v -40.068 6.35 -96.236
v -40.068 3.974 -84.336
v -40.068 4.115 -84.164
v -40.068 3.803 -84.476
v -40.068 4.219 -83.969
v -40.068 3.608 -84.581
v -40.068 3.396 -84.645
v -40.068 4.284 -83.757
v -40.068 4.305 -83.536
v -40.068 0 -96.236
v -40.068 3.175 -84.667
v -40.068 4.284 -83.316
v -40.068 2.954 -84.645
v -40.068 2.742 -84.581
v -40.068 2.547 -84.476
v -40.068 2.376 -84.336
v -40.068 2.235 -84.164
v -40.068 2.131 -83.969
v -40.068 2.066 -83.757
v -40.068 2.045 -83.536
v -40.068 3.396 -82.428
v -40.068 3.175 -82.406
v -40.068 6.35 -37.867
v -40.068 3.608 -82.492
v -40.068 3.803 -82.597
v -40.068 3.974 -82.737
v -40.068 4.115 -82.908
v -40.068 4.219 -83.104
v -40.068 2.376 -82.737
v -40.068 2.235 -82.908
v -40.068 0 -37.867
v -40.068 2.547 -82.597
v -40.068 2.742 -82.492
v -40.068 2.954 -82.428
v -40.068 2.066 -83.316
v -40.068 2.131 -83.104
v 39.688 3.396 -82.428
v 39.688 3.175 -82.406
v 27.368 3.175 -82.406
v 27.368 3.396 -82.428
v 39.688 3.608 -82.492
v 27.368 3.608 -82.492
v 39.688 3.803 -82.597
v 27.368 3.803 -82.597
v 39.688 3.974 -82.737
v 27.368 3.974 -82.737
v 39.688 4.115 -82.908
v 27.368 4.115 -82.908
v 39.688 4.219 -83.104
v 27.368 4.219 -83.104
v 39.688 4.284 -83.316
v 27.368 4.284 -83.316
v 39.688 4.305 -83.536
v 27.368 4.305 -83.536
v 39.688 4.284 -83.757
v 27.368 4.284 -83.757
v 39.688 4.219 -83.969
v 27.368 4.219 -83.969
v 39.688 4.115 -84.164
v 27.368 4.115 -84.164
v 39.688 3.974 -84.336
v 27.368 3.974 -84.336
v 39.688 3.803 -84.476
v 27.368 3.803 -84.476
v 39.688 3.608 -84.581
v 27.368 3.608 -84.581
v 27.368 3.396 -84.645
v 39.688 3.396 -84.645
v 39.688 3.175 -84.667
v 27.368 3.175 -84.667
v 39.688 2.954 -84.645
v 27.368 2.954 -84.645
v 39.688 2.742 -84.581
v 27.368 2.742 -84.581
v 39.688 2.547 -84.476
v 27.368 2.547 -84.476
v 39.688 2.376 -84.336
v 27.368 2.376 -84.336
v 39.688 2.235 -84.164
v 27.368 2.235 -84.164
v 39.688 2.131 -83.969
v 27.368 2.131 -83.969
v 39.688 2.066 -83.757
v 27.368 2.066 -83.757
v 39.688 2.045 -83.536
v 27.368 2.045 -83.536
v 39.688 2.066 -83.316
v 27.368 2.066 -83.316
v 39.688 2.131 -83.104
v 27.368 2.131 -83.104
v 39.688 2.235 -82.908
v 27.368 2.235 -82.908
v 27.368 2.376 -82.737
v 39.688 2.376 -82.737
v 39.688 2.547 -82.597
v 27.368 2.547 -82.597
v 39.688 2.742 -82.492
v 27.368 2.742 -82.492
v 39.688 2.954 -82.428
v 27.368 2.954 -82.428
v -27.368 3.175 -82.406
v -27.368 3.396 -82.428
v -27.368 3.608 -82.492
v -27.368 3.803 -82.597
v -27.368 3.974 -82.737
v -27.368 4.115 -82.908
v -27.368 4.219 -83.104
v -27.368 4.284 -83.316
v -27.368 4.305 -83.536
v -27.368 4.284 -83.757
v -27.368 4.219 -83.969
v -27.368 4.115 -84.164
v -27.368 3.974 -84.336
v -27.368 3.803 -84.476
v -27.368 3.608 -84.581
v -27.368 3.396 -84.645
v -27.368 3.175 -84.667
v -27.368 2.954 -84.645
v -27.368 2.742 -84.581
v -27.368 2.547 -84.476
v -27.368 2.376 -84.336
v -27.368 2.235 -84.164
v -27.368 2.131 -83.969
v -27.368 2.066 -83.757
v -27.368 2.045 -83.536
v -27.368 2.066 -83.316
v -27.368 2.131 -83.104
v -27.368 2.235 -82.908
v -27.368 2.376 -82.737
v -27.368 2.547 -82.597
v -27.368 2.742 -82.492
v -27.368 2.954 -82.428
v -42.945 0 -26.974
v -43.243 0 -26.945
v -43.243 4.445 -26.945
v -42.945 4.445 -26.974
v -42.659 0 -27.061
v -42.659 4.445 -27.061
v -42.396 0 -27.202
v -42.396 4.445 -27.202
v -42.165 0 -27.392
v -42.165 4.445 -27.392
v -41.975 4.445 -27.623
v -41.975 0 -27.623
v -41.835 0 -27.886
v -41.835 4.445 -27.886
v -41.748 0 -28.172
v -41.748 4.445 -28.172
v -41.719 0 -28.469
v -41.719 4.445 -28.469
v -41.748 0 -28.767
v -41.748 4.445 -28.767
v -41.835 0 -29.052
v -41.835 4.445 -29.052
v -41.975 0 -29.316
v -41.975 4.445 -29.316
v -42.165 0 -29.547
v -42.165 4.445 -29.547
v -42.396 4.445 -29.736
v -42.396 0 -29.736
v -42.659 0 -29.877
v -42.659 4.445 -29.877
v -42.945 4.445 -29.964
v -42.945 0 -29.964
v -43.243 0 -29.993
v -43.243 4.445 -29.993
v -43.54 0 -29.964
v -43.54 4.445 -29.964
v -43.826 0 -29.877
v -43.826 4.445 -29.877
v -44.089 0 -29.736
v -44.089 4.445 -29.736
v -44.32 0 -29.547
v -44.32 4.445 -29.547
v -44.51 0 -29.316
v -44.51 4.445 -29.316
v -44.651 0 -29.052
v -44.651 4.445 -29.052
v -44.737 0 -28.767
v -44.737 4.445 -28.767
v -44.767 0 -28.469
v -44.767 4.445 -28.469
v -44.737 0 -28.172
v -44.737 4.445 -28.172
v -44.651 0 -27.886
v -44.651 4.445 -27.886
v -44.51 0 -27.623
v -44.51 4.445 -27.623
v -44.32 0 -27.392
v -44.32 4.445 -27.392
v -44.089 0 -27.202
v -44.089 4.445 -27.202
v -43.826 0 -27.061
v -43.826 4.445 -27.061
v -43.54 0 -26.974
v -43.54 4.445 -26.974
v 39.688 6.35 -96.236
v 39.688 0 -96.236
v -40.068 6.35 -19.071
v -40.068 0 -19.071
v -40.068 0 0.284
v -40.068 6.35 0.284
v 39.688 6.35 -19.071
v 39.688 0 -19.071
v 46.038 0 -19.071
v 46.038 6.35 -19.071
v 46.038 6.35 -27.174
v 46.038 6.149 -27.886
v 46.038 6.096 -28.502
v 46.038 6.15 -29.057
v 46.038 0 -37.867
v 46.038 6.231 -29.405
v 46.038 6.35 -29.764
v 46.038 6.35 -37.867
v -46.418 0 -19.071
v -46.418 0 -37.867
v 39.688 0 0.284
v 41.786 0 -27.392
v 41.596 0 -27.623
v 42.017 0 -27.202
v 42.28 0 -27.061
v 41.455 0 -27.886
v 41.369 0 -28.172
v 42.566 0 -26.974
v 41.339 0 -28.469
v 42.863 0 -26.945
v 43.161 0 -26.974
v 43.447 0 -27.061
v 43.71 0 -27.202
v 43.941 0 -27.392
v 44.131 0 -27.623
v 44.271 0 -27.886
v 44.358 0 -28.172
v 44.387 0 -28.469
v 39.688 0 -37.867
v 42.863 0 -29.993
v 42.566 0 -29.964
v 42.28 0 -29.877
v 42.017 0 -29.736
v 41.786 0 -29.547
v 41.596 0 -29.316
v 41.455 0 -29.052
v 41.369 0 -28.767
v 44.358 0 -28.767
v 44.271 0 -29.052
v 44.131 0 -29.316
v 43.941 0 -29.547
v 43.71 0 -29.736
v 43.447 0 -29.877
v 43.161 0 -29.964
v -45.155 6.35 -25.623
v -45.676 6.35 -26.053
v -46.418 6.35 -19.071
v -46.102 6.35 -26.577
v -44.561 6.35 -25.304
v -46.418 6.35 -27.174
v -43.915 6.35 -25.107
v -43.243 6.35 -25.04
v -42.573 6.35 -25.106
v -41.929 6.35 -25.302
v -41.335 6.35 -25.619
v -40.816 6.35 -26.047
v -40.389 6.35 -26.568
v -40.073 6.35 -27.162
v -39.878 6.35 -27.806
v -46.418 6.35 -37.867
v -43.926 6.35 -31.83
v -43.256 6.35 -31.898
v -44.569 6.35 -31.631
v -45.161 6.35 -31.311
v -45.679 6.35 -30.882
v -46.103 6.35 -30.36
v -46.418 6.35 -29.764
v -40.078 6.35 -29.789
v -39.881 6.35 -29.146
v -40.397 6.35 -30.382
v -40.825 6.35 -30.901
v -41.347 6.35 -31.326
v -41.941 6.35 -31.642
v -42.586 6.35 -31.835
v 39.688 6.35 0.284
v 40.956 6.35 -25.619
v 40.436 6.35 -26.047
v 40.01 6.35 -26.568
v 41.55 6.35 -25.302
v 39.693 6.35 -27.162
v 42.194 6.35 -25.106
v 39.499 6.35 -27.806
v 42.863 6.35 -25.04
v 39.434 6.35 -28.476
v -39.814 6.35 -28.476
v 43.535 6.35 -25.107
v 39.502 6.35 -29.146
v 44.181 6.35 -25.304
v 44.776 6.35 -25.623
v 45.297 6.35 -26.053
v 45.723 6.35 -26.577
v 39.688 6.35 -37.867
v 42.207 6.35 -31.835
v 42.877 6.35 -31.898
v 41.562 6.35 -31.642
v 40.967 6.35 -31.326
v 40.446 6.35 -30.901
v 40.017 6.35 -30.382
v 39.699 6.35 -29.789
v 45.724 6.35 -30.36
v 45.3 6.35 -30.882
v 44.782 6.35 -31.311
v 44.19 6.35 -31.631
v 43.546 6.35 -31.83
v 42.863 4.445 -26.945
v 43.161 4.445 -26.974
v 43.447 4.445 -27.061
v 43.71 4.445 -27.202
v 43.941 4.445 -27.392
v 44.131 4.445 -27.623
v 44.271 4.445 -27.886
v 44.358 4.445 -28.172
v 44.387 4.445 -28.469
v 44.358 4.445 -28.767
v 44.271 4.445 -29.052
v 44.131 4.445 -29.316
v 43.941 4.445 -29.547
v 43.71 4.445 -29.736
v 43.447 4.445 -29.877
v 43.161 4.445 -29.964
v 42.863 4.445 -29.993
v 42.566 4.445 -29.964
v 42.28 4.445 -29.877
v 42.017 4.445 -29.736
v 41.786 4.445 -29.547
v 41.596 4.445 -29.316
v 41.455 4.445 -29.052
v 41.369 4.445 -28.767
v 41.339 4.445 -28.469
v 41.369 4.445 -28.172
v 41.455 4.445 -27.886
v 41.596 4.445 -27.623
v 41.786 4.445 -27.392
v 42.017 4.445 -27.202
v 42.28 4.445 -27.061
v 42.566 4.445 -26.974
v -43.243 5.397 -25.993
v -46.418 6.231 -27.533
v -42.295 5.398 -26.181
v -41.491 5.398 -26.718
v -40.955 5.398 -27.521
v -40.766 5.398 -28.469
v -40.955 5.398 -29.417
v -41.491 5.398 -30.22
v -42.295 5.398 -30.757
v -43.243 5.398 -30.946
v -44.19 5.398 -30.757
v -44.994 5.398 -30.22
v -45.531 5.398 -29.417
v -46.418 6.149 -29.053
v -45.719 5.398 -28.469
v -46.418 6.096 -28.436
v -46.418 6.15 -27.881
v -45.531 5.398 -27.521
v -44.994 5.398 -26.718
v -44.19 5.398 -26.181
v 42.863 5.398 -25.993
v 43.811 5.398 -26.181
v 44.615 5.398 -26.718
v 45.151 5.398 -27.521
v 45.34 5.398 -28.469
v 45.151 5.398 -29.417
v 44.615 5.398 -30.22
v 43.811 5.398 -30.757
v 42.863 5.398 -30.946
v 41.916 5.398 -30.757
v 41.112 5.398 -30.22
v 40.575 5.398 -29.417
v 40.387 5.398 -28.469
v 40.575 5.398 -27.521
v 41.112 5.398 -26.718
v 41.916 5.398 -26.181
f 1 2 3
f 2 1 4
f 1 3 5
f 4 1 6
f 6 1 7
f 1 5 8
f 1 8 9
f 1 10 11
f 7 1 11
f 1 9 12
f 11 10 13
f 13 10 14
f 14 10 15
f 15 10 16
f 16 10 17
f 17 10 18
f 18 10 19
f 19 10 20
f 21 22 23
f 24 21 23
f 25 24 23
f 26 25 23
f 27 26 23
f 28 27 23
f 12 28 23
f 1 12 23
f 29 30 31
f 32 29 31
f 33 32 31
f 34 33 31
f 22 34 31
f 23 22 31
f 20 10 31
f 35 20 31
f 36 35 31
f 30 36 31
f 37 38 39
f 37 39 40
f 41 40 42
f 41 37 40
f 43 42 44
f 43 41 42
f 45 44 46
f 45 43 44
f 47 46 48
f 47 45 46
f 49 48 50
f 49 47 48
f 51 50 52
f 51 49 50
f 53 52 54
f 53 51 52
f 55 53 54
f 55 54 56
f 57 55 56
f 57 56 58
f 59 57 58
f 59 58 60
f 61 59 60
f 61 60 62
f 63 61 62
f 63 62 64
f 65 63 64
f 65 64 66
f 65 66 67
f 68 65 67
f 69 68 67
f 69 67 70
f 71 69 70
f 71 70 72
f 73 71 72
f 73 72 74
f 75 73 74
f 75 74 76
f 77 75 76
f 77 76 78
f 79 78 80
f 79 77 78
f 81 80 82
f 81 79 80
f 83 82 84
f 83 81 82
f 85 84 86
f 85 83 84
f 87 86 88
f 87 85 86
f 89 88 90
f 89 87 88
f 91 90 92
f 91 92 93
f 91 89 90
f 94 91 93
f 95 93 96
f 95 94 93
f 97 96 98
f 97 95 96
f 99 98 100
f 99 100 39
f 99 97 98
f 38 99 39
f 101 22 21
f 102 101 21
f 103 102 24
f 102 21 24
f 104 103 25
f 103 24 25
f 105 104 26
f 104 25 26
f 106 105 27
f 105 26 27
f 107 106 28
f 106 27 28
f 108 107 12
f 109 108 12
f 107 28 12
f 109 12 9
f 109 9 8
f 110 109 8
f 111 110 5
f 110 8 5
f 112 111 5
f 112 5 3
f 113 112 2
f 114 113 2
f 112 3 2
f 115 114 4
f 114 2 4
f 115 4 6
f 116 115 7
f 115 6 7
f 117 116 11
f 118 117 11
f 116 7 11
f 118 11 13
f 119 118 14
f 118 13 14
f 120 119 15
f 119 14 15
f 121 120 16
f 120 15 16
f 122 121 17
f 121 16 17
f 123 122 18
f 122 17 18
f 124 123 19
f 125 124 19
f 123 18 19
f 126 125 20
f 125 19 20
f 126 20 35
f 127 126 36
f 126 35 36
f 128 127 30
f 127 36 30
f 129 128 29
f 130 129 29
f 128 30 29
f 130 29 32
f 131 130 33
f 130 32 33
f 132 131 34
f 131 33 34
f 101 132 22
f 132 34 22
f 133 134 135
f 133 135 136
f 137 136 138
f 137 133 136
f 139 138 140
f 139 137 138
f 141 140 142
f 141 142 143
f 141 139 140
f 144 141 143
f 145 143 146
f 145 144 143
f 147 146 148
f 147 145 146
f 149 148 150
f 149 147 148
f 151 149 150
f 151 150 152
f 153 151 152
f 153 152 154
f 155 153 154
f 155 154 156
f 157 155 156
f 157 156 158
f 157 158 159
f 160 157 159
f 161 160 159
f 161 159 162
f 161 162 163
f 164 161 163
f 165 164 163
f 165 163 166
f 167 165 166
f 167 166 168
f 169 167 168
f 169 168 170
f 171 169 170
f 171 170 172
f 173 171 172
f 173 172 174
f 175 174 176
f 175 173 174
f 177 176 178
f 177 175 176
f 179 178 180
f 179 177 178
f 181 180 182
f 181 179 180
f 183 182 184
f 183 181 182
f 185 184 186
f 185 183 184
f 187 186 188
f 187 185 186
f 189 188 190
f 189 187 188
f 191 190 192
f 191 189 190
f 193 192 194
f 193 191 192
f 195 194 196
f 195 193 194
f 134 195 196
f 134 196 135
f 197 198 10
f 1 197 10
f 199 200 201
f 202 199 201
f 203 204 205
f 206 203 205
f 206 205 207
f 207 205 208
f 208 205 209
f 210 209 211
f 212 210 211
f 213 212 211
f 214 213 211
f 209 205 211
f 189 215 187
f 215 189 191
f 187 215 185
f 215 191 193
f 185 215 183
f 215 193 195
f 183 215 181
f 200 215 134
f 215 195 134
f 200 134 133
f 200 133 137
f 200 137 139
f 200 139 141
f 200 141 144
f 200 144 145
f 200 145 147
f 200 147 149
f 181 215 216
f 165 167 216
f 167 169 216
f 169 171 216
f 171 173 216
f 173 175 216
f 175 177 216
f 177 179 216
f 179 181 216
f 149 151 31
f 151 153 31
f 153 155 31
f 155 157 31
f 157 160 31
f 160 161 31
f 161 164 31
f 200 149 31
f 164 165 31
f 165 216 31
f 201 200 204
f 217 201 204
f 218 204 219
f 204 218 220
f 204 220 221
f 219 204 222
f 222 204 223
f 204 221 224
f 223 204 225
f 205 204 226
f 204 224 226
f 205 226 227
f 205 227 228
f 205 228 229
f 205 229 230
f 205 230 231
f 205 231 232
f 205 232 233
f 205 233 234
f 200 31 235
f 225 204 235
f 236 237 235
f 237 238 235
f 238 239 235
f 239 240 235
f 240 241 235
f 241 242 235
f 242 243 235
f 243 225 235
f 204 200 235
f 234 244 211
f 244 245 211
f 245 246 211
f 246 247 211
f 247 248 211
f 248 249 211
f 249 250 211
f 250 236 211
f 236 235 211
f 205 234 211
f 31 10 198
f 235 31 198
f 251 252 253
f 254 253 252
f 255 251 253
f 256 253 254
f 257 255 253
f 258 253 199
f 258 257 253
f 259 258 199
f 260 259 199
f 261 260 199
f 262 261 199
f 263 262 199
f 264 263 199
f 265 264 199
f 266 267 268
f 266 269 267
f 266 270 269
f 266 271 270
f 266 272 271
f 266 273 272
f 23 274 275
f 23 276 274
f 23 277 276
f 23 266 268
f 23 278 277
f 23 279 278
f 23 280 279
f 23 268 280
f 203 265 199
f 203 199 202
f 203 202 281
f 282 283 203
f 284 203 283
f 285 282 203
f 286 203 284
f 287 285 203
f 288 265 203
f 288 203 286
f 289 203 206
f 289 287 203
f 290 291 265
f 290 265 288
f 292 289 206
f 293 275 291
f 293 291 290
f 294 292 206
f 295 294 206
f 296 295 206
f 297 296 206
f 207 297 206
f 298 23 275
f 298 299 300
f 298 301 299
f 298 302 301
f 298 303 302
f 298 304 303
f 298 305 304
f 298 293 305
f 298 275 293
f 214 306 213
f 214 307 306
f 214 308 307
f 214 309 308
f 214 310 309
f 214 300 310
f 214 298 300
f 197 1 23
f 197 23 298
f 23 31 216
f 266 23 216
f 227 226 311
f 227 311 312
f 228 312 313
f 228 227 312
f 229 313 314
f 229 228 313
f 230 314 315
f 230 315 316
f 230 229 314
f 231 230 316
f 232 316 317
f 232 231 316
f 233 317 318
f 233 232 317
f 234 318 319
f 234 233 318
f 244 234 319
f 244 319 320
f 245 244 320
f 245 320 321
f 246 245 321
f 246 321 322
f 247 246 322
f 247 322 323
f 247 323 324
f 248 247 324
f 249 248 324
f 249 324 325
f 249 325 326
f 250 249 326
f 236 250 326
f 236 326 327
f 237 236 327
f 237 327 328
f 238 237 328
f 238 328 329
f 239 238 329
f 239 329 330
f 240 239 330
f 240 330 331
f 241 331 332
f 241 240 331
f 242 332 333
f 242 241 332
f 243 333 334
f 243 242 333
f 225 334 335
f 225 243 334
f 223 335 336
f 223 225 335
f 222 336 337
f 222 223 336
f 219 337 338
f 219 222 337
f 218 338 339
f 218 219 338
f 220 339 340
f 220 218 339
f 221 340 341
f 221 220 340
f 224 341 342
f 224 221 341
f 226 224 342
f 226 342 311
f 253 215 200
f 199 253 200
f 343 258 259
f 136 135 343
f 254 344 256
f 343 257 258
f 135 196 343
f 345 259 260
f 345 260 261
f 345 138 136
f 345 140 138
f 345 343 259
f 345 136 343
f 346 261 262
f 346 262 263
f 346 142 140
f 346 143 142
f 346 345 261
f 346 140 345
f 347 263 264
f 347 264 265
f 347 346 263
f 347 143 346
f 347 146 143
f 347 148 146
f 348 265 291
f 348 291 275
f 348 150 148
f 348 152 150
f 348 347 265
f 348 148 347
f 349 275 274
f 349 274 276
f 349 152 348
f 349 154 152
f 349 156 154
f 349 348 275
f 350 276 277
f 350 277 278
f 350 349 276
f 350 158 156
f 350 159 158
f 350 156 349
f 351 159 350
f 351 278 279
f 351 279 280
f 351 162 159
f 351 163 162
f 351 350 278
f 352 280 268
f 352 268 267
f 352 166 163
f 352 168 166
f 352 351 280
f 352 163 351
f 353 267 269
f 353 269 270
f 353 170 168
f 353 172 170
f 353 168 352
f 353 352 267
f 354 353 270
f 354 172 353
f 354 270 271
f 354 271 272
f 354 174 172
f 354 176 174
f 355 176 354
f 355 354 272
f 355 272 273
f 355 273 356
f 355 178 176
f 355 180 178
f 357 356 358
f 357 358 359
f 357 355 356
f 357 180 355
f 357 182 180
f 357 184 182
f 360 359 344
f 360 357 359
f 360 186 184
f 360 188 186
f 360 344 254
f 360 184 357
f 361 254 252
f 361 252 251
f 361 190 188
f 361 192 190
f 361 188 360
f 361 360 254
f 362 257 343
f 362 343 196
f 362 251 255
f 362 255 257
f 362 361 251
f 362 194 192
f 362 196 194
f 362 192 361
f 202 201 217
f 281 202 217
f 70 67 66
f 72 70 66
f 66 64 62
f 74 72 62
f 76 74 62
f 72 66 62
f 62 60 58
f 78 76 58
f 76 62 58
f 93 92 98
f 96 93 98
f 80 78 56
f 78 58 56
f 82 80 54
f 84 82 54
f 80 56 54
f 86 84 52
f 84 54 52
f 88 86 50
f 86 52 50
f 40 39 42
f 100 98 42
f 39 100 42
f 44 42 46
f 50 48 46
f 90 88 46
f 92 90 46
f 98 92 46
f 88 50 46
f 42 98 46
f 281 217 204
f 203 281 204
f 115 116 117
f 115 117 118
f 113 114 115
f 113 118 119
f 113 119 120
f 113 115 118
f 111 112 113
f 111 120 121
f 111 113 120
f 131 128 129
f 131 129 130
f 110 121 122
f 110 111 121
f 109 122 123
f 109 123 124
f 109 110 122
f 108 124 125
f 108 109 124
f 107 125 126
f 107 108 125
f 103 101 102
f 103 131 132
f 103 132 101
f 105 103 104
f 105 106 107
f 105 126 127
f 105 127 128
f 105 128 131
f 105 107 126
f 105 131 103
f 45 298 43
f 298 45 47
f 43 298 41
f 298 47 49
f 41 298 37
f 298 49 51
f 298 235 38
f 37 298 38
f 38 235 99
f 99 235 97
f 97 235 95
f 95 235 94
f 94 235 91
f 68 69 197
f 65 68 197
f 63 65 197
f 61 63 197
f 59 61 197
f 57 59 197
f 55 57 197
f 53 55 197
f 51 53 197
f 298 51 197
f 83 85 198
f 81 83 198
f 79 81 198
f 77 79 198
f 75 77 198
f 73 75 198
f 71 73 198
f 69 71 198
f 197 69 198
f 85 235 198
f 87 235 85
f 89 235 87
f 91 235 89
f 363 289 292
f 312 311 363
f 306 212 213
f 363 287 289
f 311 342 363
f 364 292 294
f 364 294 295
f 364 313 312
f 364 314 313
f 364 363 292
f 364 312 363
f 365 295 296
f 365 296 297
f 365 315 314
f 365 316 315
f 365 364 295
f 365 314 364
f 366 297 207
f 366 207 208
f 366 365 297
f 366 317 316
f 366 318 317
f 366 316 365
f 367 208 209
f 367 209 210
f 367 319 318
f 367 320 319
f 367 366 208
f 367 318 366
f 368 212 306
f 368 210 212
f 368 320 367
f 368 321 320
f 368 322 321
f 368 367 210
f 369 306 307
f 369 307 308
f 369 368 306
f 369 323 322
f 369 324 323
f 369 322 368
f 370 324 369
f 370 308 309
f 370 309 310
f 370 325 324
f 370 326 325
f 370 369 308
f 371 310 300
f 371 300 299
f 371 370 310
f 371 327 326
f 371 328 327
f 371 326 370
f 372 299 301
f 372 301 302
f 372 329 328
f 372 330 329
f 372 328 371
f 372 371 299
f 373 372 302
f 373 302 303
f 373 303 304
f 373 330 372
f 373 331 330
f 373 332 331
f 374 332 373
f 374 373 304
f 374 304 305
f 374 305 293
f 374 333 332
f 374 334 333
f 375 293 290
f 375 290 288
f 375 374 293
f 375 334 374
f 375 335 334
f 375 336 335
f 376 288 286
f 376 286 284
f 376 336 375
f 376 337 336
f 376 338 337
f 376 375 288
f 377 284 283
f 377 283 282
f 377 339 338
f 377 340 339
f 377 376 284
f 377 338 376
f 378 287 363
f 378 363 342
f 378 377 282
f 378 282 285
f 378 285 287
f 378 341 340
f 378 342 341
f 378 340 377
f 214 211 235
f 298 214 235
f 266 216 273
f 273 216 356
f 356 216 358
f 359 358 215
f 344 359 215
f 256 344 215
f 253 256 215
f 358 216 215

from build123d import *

# Parameters (mm, degrees)
SKETCH1_R           = 1.524
BOSS_EXTRUDE1_DEPTH = 6.35
CHAMFER1_SIZE       = 1.905
SKETCH2_R           = 1.1303
CUT_EXTRUDE1_DEPTH  = 12.7


with BuildPart() as part:
    # Sketch1 → Boss-Extrude1 (new body)
    with BuildSketch(Plane(origin=(0, 0, 0), x_dir=(1, 0, 0), z_dir=(0, 1, 0))):
        Polygon((39.688377001, 76.199995009), (39.688377001, 96.236406132), (-40.067622999, 96.236406132), (-40.067622999, 76.199995009), (-40.067622999, 57.403995009), (-40.067622999, 37.867206132), (-46.417622999, 37.867206132), (-46.417622999, 19.071206132), (-40.067622999, 19.071206132), (-40.067622999, -0.283593868), (39.688377001, -0.283593868), (39.688377001, 19.071206132), (46.038377001, 19.071206132), (46.038377001, 37.867206132), (39.688377001, 37.867206132), (39.688377001, 57.403995009), align=None)
        with Locations(Location((-43.242622999, 28.469206132, 0), (0, 0, 270))):
            Circle(SKETCH1_R, mode=Mode.SUBTRACT)
        with Locations(Location((42.863377001, 28.469206132, 0), (0, 0, 270))):
            Circle(SKETCH1_R, mode=Mode.SUBTRACT)
    extrude(amount=BOSS_EXTRUDE1_DEPTH)

    # Chamfer1
    # the kernel refuses this chamfer: 1.905 mm, written as the material it takes off along each edge
    with BuildSketch(Plane(origin=(42.863377001, 6.35, -28.469206132), x_dir=(0, 0, 1), z_dir=(-1, 0, 0))) as chamfer1_piece_1:
        Polygon((1.524 + CHAMFER1_SIZE, 0), (1.524, -CHAMFER1_SIZE), (1.524, 0), align=None)
    revolve(axis=Axis((42.863377001, 6.35, -28.469206132), (0, 1, 0)), mode=Mode.SUBTRACT)
    with BuildSketch(Plane(origin=(-43.242622999, 6.35, -28.469206132), x_dir=(0, 0, 1), z_dir=(-1, 0, 0))) as chamfer1_piece_2:
        Polygon((1.524 + CHAMFER1_SIZE, 0), (1.524, -CHAMFER1_SIZE), (1.524, 0), align=None)
    revolve(axis=Axis((-43.242622999, 6.35, -28.469206132), (0, 1, 0)), mode=Mode.SUBTRACT)

    # Sketch2 → Cut-Extrude1 (cut)
    with BuildSketch(Plane.ZY.offset(40.067622999)):
        with Locations((-83.536406132, 3.175)):
            Circle(SKETCH2_R)
    cut_extrude1 = extrude(amount=-CUT_EXTRUDE1_DEPTH, mode=Mode.SUBTRACT)

    # Mirror5: Cut-Extrude1 across plane
    add(cut_extrude1.mirror(Plane(origin=(0, 0, 0), x_dir=(0, 0, 1), z_dir=(1, 0, 0))), mode=Mode.SUBTRACT)


solid = part.part
